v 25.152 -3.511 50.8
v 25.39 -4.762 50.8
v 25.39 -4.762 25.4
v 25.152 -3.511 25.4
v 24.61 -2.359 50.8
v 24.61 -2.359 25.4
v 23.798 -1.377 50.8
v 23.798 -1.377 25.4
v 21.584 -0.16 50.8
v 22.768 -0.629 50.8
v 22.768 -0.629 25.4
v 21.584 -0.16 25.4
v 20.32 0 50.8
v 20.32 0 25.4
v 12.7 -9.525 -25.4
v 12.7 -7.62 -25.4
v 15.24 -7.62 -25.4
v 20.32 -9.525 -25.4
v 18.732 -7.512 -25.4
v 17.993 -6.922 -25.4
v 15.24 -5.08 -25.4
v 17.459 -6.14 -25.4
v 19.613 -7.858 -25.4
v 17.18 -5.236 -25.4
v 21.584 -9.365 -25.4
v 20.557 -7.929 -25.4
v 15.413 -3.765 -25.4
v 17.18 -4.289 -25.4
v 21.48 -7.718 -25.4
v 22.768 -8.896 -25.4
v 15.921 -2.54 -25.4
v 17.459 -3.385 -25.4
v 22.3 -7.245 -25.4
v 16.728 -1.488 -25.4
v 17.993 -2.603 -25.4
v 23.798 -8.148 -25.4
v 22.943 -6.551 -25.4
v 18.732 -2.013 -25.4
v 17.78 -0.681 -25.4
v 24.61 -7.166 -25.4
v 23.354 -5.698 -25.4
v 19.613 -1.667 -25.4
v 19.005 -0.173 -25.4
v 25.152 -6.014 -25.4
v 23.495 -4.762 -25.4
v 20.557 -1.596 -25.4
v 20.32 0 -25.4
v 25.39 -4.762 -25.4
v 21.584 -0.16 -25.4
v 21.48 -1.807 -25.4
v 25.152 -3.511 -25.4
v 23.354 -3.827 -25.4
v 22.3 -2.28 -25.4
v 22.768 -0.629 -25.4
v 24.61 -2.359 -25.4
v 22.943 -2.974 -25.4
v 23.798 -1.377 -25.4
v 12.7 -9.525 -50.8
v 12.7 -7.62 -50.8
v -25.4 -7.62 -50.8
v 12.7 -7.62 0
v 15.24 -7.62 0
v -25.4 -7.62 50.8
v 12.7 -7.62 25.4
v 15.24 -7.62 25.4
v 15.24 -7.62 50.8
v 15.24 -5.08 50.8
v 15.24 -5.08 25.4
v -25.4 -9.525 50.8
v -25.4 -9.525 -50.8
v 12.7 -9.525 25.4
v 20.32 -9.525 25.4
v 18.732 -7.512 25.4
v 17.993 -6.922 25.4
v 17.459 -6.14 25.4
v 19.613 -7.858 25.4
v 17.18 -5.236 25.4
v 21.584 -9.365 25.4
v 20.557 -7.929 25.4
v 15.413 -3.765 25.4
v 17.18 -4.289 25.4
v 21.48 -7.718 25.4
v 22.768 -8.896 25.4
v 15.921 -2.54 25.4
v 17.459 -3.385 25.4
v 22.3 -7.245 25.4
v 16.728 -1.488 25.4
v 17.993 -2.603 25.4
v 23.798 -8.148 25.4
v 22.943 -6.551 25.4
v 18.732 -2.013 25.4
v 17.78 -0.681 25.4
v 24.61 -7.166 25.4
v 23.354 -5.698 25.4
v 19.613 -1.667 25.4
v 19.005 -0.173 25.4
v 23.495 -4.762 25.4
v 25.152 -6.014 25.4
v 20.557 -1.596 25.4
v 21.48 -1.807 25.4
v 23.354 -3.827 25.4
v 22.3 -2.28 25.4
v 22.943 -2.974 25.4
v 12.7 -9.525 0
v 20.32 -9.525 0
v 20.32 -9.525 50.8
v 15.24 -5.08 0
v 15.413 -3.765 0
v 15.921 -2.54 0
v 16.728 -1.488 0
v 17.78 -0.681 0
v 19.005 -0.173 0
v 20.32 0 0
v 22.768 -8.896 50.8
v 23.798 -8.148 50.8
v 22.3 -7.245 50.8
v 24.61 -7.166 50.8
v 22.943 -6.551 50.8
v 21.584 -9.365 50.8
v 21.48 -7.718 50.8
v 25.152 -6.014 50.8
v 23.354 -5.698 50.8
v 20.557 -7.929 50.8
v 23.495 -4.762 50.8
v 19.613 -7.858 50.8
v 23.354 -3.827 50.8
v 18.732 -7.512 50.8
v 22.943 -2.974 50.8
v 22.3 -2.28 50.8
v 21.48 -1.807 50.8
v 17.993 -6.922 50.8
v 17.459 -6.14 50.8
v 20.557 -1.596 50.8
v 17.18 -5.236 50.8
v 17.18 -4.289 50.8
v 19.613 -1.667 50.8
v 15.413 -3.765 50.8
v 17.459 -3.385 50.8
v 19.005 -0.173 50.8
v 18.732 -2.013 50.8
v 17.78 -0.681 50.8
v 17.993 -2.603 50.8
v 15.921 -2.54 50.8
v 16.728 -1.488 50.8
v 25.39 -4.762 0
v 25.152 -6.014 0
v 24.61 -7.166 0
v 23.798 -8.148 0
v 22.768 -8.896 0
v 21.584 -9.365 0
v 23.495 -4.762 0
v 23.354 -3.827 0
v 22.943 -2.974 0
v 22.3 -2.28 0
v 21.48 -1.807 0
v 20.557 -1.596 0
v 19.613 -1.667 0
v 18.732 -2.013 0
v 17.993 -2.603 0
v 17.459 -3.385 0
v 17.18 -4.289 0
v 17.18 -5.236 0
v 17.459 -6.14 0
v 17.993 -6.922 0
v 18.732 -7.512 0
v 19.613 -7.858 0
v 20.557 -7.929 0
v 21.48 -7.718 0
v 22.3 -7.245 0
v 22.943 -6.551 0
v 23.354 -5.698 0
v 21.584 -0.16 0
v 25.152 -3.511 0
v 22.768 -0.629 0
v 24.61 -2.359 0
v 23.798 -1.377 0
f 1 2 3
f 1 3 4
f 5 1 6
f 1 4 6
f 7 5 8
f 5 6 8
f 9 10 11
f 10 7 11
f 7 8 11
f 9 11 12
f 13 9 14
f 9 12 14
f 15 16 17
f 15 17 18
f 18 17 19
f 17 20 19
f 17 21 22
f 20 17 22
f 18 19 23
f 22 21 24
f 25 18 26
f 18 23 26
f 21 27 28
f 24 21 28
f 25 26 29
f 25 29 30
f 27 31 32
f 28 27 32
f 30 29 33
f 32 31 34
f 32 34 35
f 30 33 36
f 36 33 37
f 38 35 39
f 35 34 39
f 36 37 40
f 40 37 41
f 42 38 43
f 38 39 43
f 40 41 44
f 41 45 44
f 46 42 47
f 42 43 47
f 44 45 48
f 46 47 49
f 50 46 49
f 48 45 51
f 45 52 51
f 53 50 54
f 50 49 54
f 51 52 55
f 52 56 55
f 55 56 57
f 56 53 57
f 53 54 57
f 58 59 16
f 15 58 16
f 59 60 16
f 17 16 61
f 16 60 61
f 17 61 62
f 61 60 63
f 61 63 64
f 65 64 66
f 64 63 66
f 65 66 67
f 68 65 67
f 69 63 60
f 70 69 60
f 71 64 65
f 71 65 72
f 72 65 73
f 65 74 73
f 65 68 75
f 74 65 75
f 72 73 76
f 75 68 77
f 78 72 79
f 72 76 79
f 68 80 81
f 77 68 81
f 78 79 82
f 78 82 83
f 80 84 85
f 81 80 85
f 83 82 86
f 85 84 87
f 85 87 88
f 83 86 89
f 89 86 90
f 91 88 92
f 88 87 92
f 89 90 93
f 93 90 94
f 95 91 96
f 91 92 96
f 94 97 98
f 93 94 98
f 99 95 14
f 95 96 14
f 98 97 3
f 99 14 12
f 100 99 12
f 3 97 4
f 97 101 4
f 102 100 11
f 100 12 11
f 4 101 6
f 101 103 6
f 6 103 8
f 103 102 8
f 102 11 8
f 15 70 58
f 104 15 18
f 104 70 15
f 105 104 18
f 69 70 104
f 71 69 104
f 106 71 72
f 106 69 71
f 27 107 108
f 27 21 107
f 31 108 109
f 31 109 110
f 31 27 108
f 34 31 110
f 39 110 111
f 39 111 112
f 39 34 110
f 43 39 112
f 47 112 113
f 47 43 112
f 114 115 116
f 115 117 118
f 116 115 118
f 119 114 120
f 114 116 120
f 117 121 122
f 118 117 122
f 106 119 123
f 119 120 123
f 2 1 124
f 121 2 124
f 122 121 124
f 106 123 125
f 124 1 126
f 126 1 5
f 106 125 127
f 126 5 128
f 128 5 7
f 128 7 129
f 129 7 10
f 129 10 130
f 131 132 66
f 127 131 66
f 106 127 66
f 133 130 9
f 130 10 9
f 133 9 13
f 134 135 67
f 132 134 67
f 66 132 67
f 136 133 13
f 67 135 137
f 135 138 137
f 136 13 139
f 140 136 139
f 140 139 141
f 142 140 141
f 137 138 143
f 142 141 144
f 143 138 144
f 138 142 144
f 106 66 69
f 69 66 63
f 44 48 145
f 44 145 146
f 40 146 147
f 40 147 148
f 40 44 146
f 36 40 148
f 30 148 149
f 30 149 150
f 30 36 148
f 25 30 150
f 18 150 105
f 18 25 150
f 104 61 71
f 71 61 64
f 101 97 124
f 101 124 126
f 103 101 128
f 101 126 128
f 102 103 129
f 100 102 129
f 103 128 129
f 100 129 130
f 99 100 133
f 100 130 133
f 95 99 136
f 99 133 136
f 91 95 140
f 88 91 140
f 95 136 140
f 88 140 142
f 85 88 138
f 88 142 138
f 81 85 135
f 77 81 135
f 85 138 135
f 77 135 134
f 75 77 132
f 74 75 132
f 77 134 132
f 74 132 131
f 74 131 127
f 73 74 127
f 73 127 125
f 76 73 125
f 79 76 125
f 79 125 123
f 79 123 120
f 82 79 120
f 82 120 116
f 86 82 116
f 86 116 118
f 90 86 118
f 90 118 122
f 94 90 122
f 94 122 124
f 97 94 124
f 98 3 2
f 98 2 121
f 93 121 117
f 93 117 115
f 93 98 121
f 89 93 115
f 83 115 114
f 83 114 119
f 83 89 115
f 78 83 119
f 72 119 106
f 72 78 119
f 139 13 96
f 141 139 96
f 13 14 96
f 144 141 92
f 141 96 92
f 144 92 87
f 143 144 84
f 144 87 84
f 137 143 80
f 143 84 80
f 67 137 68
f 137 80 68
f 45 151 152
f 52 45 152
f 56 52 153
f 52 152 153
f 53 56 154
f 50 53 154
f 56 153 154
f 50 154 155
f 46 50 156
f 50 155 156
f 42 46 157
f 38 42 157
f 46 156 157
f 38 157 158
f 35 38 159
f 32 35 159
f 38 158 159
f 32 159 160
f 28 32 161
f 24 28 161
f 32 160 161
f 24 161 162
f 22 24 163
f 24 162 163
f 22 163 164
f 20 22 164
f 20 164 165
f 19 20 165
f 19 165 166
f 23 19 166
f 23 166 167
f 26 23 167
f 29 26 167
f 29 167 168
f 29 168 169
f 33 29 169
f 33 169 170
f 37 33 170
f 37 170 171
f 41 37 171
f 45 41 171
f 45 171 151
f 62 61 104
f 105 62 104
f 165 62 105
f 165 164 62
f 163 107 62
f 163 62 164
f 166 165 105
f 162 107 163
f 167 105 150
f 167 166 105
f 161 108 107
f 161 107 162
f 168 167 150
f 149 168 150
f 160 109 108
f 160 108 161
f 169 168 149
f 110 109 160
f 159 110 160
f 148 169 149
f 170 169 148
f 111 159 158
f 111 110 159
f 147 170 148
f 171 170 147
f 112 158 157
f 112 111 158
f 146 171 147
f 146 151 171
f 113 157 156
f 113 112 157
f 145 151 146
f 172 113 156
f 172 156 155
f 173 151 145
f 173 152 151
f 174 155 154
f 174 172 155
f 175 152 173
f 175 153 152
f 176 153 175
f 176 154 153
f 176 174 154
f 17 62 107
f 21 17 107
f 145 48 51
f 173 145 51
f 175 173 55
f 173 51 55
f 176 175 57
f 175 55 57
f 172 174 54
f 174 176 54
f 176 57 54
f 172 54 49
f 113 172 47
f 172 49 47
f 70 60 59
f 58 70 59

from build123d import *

# Parameters (mm, degrees)
F0_W        = 12.7
F0_H        = 25.4
F1_DEPTH    = 9.525
F2_T1_DEPTH = 50.8
F2_T3_DEPTH = 50.8
F3_R        = 3.175
F4_DEPTH    = 101.601
F5_W        = 40.64
F5_H        = 7.62
F6_DEPTH    = 101.601
F7_R        = 5.07999


# Not quite as in the source:
# - a fillet or chamfer that OpenCascade refuses, or shapes differently, is made with other operations: its cross-section is extruded or revolved along the edge and cut away or added
# - a fillet or chamfer is up to 0.001 mm smaller than in the source, because OpenCascade refuses the exact size


with BuildPart() as f1:
    # F0 (on Front) → F1 (new body)
    with BuildSketch(Plane.XZ):
        with Locations((19.05, 38.1)):
            Rectangle(F0_W, F0_H)
        Polygon((12.7, 25.4), (12.7, 50.8), (-25.4, 50.8), (-25.4, -50.8), (12.7, -50.8), (12.7, -25.4), (12.7, 0), align=None)
        with Locations((19.05, -12.7)):
            Rectangle(F0_W, F0_H)
    extrude(amount=F1_DEPTH)

    # F2: fillet of radius 5.08 on 4 edges, made by hand

    # F2_s2 → F2_t1 (cut)
    with BuildSketch(Plane.XY.offset(12.7)):
        with BuildLine():
            ThreePointArc((25.4, -5.08), (23.9121024484, -1.4878975516), (20.32, 0))
            Line((20.32, 0), (25.4, 0))
            Line((25.4, 0), (25.4, -5.08))
        make_face()
        with BuildLine():
            ThreePointArc((25.4, -4.445), (23.9121024484, -8.0371024484), (20.32, -9.525))
            Line((20.32, -9.525), (25.4, -9.525))
            Line((25.4, -9.525), (25.4, -4.445))
        make_face()
    extrude(amount=F2_T1_DEPTH, mode=Mode.SUBTRACT)

    # F2_s4 → F2_t3 (cut)
    with BuildSketch(Plane.XY.offset(-38.1)):
        with BuildLine():
            ThreePointArc((25.4, -5.08), (23.9121024484, -1.4878975516), (20.32, 0))
            Line((20.32, 0), (25.4, 0))
            Line((25.4, 0), (25.4, -5.08))
        make_face()
        with BuildLine():
            ThreePointArc((25.4, -4.445), (23.9121024484, -8.0371024484), (20.32, -9.525))
            Line((20.32, -9.525), (25.4, -9.525))
            Line((25.4, -9.525), (25.4, -4.445))
        make_face()
    extrude(amount=F2_T3_DEPTH, mode=Mode.SUBTRACT)

    # F3 (on face) → F4 (cut, through all)
    with BuildSketch(Plane.XY.offset(50.8)):
        with Locations((20.32, -4.7625)):
            Circle(F3_R)
    extrude(amount=-F4_DEPTH, mode=Mode.SUBTRACT)

    # F5 (on face) → F6 (cut, through all)
    with BuildSketch(Plane.XY.offset(50.8)):
        with Locations((-5.08, -3.81)):
            Rectangle(F5_W, F5_H)
    extrude(amount=-F6_DEPTH, mode=Mode.SUBTRACT)

    # F7 (radius 5.08 in the source; OpenCascade refuses exactly that, so slightly less here)
    f7_edges = [f1.edges().sort_by_distance(p)[0] for p in [
        (15.24, 0, 38.1),
        (15.24, 0, -12.7),
    ]]
    fillet(f7_edges, radius=F7_R)


solid = f1.part
